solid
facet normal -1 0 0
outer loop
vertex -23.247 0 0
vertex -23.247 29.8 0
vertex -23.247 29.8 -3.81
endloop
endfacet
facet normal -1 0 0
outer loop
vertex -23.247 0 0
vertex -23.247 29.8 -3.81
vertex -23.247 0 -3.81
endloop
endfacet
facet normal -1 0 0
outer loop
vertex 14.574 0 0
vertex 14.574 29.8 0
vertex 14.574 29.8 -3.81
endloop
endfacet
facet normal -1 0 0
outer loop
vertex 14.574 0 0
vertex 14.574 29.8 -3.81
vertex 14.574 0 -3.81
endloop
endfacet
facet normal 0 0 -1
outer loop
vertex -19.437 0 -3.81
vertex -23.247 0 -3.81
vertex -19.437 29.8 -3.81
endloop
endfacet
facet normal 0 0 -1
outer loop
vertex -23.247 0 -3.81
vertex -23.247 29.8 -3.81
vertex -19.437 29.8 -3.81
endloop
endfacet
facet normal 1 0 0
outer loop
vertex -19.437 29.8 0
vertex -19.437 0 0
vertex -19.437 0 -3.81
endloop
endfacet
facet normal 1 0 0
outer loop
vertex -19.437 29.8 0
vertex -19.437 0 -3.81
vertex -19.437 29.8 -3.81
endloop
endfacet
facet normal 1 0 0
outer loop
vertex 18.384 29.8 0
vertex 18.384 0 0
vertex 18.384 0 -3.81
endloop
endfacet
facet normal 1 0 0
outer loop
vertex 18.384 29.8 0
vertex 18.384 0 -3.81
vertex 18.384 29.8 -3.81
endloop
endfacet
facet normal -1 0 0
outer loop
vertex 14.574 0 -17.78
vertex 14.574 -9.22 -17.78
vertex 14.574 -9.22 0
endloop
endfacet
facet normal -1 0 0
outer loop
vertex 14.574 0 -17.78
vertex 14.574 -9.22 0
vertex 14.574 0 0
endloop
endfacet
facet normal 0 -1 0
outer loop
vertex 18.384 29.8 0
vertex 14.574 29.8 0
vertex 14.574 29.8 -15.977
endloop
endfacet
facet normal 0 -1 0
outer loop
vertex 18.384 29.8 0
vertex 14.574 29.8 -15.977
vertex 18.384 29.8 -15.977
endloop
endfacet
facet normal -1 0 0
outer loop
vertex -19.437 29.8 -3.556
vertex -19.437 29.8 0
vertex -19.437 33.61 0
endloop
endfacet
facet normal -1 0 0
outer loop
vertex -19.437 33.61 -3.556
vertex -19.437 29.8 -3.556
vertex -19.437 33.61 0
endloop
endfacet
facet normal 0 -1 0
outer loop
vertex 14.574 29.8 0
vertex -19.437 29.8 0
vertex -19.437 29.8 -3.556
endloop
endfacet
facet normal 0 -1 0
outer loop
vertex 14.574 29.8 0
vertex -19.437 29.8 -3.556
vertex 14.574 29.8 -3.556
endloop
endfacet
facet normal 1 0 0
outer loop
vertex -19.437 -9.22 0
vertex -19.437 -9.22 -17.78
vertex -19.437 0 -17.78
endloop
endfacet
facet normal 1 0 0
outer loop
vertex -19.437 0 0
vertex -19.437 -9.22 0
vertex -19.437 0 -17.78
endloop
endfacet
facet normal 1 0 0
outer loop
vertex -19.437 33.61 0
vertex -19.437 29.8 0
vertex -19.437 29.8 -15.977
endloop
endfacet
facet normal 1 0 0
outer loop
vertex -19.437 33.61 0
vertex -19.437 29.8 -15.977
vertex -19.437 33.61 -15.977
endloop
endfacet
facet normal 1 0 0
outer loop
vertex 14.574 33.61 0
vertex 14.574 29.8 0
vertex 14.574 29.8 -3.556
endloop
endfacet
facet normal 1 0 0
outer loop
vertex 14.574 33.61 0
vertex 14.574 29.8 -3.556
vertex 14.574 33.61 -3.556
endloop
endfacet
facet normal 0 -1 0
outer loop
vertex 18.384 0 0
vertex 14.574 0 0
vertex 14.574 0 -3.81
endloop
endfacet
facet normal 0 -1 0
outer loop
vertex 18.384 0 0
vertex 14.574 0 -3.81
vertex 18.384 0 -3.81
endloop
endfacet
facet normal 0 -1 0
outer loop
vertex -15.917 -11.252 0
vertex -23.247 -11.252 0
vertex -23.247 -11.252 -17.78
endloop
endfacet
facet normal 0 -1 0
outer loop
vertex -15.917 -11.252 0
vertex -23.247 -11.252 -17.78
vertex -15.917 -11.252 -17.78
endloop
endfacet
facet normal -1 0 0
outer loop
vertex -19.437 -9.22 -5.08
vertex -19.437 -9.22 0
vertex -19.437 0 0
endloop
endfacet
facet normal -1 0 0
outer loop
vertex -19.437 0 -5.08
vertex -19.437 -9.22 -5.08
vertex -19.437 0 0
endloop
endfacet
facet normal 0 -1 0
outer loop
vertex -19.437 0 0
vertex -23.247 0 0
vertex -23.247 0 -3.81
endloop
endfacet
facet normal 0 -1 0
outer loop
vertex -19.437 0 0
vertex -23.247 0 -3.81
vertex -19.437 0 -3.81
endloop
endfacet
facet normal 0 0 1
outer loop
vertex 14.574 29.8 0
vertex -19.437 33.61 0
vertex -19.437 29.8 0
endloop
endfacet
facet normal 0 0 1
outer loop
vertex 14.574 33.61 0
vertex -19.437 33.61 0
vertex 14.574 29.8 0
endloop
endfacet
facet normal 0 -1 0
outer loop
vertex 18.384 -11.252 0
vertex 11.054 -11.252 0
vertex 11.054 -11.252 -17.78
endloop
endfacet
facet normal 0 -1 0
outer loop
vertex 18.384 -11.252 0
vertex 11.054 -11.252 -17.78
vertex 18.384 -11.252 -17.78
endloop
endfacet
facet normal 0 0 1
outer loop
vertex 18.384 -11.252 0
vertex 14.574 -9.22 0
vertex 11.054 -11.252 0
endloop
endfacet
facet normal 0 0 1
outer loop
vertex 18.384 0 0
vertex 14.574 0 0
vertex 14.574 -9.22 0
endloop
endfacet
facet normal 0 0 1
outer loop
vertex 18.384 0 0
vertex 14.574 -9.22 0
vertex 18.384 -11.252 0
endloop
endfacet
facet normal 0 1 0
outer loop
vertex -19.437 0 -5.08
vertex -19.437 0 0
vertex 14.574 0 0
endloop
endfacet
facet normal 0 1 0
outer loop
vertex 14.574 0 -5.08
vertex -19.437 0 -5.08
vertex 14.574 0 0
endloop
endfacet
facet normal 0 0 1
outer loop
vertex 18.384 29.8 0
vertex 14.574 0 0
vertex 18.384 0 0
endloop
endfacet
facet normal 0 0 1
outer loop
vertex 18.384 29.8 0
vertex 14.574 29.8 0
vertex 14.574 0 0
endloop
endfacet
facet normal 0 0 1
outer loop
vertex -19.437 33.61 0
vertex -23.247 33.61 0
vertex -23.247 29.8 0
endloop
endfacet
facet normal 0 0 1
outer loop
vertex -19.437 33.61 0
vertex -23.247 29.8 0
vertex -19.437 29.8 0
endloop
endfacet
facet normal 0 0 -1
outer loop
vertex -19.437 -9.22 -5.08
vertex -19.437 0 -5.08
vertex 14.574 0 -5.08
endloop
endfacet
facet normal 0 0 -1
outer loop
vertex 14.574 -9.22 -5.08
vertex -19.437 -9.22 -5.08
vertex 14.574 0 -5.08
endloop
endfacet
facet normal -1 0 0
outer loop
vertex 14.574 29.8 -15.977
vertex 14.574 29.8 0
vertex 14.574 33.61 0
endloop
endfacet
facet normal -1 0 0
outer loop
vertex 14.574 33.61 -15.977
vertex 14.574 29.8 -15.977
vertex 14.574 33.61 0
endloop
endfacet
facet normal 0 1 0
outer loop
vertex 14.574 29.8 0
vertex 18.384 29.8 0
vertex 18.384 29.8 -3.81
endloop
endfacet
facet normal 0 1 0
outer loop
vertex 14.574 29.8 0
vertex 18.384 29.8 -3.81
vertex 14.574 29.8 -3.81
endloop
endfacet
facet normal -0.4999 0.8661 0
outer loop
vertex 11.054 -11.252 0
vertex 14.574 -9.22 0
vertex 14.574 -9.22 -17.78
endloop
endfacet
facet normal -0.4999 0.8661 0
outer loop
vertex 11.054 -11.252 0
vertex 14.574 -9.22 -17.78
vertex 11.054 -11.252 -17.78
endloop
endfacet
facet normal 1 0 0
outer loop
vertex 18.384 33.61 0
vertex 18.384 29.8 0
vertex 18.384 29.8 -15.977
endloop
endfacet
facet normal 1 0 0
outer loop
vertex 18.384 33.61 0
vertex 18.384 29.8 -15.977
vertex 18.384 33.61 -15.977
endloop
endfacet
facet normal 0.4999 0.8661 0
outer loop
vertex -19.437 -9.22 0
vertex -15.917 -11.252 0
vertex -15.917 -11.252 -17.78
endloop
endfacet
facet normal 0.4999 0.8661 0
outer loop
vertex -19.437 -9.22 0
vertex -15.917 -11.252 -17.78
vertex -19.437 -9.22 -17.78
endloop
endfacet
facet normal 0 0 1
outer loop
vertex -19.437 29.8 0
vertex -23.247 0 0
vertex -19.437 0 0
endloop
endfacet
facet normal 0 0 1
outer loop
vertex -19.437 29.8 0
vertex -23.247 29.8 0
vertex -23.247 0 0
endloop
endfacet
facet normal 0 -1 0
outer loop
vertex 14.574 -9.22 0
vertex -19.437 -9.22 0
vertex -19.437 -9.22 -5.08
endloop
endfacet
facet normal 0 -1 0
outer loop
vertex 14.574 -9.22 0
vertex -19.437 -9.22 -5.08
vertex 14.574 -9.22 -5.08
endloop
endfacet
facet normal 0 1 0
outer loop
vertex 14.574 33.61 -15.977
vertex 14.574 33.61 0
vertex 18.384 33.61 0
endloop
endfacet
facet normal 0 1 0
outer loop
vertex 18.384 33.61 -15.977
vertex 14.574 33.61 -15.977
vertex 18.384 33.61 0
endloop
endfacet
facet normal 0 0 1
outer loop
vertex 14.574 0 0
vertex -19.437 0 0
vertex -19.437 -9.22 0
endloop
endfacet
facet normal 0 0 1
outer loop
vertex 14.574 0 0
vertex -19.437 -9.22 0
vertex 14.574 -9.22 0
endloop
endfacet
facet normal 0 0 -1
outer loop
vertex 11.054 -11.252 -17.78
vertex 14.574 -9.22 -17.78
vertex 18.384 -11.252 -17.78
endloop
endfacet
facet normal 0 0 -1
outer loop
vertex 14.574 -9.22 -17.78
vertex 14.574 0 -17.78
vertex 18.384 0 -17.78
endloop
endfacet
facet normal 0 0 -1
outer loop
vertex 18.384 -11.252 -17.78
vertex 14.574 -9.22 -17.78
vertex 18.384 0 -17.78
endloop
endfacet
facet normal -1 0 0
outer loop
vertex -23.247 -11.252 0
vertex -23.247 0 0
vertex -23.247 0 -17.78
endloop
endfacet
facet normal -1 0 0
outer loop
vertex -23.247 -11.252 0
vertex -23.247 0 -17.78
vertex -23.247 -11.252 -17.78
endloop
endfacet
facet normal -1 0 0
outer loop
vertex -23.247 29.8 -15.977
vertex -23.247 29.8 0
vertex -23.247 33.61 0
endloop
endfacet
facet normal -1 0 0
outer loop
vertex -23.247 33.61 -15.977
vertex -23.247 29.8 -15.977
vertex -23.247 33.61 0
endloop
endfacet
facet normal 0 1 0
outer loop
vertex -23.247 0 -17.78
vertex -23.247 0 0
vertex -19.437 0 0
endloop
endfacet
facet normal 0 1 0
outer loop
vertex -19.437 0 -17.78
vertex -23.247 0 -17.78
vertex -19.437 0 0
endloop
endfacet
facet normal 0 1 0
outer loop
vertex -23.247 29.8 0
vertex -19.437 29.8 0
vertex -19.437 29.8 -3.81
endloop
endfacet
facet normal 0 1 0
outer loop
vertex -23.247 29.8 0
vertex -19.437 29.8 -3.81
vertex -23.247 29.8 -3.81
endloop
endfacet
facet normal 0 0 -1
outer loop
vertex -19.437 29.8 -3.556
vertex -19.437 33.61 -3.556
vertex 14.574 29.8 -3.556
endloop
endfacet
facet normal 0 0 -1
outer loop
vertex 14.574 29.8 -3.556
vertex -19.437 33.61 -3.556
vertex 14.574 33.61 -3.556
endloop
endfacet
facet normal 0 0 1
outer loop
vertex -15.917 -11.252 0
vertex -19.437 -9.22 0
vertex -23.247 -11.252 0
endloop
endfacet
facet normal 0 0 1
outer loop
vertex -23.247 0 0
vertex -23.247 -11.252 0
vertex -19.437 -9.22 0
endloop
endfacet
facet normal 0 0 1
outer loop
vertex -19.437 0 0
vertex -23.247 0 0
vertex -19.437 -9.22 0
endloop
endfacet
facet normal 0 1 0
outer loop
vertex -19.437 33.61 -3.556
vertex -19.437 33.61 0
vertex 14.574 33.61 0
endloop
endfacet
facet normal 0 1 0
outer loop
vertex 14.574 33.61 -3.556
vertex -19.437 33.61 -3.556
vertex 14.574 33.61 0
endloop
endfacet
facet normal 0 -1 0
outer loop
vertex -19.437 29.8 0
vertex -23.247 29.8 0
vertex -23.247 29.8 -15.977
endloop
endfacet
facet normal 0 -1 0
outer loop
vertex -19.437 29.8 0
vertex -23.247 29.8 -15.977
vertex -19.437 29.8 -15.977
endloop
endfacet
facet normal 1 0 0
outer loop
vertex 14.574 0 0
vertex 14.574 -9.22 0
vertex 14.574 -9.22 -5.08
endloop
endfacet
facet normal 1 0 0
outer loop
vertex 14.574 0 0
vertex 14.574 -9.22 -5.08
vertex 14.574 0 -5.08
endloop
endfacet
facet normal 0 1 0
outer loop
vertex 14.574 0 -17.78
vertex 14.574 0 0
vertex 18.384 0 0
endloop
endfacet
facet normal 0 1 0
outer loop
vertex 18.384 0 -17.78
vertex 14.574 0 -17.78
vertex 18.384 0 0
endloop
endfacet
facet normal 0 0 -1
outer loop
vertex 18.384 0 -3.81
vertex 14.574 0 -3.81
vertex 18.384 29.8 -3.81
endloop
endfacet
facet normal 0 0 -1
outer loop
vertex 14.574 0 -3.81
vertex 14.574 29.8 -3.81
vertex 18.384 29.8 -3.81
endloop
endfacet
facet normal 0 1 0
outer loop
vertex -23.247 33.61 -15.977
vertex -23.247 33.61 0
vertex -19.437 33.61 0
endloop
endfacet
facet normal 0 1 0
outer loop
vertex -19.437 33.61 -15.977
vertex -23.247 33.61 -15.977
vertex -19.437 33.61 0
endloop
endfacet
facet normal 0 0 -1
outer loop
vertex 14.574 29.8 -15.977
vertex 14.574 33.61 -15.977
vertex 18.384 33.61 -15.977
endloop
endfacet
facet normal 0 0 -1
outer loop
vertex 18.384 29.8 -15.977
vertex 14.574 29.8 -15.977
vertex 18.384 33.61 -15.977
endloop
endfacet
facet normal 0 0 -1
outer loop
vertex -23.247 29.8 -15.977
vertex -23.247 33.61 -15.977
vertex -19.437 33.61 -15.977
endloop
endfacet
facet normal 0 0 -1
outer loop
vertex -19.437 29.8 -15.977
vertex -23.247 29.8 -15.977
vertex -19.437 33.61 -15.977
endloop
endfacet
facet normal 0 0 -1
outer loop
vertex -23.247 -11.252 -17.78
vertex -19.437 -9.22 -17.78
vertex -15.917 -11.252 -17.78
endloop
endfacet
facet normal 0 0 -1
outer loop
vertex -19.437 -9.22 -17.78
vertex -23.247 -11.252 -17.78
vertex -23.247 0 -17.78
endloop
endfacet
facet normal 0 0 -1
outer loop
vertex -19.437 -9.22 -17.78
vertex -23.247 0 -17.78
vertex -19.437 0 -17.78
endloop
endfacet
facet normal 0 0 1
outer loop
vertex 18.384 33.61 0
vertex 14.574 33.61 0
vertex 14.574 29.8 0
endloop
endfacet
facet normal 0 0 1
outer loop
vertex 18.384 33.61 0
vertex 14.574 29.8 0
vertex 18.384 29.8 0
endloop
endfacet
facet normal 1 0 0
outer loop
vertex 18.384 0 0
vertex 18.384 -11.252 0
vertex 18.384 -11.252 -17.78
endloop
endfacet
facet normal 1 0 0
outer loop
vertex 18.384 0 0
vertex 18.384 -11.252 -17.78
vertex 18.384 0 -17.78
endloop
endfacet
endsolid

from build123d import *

# Parameters (mm, degrees)
F0_W     = 3.81
F0_H     = 9.2202
F1_DEPTH = 17.78
F2_DEPTH = 3.81
F0_H_2   = 3.81
F3_DEPTH = 15.9766
F0_W_2   = 34.0106
F4_DEPTH = 5.08
F5_DEPTH = 3.556


# Not quite as in the source:
# - a feature names something its author has since deleted; it is built from what else it names


with BuildPart() as f1:
    # F0 (on Top) → F1 (new body)
    with BuildSketch(Plane.XY):
        with Locations((-21.3418023896, -4.6101)):
            Rectangle(F0_W, F0_H)
        Polygon((-15.9172751486, -11.2522), (-19.4368023896, -9.2202), (-23.2468023896, -9.2202), (-23.2468023896, -11.2522), align=None)
    extrude(amount=-F1_DEPTH)


with BuildPart() as f1b:
    # F0 (on Top) → F1, piece 2 (new body)
    with BuildSketch(Plane.XY):
        Polygon((18.3837976104, -9.2202), (14.5737976104, -9.2202), (11.0542703694, -11.2522), (18.3837976104, -11.2522), align=None)
        with Locations((16.4787976104, -4.6101)):
            Rectangle(F0_W, F0_H)
    extrude(amount=-F1_DEPTH)


with BuildPart() as f2:
    # F0 (on Top) → F2 (new body)
    with BuildSketch(Plane.XY):
        Polygon((-23.2468023896, 0), (-19.4368023896, 0), (-19.4368023896, 26.035), (-19.4368023896, 29.799785465), (-23.2468023896, 29.799785465), (-23.2468023896, 26.035), align=None)
    extrude(amount=-F2_DEPTH)


with BuildPart() as f2b:
    # F0 (on Top) → F2, piece 2 (new body)
    with BuildSketch(Plane.XY):
        Polygon((14.5737976104, 26.035), (14.5737976104, 0), (18.3837976104, 0), (18.3837976104, 26.035), (18.3837976104, 29.799785465), (14.5737976104, 29.799785465), align=None)
    extrude(amount=-F2_DEPTH)


with BuildPart() as f3:
    # F0 (on Top) → F3 (new body)
    with BuildSketch(Plane.XY):
        with Locations((-21.3418023896, 31.704785465)):
            Rectangle(F0_W, F0_H_2)
    extrude(amount=-F3_DEPTH)


with BuildPart() as f3b:
    # F0 (on Top) → F3, piece 2 (new body)
    with BuildSketch(Plane.XY):
        with Locations((16.4787976104, 31.704785465)):
            Rectangle(F0_W, F0_H_2)
    extrude(amount=-F3_DEPTH)


with BuildPart() as f4:
    # F0 (on Top) → F4 (new body)
    with BuildSketch(Plane.XY):
        with Locations((-2.4315023896, -4.6101)):
            Rectangle(F0_W_2, F0_H)
    extrude(amount=-F4_DEPTH)


with BuildPart() as f5:
    # F0 (on Top) → F5 (new body)
    with BuildSketch(Plane.XY):
        with Locations((-2.4315023896, 31.704785465)):
            Rectangle(F0_W_2, F0_H_2)
    extrude(amount=-F5_DEPTH)


solid = Compound([f1.part, f1b.part, f2.part, f2b.part, f3.part, f3b.part, f4.part, f5.part])
